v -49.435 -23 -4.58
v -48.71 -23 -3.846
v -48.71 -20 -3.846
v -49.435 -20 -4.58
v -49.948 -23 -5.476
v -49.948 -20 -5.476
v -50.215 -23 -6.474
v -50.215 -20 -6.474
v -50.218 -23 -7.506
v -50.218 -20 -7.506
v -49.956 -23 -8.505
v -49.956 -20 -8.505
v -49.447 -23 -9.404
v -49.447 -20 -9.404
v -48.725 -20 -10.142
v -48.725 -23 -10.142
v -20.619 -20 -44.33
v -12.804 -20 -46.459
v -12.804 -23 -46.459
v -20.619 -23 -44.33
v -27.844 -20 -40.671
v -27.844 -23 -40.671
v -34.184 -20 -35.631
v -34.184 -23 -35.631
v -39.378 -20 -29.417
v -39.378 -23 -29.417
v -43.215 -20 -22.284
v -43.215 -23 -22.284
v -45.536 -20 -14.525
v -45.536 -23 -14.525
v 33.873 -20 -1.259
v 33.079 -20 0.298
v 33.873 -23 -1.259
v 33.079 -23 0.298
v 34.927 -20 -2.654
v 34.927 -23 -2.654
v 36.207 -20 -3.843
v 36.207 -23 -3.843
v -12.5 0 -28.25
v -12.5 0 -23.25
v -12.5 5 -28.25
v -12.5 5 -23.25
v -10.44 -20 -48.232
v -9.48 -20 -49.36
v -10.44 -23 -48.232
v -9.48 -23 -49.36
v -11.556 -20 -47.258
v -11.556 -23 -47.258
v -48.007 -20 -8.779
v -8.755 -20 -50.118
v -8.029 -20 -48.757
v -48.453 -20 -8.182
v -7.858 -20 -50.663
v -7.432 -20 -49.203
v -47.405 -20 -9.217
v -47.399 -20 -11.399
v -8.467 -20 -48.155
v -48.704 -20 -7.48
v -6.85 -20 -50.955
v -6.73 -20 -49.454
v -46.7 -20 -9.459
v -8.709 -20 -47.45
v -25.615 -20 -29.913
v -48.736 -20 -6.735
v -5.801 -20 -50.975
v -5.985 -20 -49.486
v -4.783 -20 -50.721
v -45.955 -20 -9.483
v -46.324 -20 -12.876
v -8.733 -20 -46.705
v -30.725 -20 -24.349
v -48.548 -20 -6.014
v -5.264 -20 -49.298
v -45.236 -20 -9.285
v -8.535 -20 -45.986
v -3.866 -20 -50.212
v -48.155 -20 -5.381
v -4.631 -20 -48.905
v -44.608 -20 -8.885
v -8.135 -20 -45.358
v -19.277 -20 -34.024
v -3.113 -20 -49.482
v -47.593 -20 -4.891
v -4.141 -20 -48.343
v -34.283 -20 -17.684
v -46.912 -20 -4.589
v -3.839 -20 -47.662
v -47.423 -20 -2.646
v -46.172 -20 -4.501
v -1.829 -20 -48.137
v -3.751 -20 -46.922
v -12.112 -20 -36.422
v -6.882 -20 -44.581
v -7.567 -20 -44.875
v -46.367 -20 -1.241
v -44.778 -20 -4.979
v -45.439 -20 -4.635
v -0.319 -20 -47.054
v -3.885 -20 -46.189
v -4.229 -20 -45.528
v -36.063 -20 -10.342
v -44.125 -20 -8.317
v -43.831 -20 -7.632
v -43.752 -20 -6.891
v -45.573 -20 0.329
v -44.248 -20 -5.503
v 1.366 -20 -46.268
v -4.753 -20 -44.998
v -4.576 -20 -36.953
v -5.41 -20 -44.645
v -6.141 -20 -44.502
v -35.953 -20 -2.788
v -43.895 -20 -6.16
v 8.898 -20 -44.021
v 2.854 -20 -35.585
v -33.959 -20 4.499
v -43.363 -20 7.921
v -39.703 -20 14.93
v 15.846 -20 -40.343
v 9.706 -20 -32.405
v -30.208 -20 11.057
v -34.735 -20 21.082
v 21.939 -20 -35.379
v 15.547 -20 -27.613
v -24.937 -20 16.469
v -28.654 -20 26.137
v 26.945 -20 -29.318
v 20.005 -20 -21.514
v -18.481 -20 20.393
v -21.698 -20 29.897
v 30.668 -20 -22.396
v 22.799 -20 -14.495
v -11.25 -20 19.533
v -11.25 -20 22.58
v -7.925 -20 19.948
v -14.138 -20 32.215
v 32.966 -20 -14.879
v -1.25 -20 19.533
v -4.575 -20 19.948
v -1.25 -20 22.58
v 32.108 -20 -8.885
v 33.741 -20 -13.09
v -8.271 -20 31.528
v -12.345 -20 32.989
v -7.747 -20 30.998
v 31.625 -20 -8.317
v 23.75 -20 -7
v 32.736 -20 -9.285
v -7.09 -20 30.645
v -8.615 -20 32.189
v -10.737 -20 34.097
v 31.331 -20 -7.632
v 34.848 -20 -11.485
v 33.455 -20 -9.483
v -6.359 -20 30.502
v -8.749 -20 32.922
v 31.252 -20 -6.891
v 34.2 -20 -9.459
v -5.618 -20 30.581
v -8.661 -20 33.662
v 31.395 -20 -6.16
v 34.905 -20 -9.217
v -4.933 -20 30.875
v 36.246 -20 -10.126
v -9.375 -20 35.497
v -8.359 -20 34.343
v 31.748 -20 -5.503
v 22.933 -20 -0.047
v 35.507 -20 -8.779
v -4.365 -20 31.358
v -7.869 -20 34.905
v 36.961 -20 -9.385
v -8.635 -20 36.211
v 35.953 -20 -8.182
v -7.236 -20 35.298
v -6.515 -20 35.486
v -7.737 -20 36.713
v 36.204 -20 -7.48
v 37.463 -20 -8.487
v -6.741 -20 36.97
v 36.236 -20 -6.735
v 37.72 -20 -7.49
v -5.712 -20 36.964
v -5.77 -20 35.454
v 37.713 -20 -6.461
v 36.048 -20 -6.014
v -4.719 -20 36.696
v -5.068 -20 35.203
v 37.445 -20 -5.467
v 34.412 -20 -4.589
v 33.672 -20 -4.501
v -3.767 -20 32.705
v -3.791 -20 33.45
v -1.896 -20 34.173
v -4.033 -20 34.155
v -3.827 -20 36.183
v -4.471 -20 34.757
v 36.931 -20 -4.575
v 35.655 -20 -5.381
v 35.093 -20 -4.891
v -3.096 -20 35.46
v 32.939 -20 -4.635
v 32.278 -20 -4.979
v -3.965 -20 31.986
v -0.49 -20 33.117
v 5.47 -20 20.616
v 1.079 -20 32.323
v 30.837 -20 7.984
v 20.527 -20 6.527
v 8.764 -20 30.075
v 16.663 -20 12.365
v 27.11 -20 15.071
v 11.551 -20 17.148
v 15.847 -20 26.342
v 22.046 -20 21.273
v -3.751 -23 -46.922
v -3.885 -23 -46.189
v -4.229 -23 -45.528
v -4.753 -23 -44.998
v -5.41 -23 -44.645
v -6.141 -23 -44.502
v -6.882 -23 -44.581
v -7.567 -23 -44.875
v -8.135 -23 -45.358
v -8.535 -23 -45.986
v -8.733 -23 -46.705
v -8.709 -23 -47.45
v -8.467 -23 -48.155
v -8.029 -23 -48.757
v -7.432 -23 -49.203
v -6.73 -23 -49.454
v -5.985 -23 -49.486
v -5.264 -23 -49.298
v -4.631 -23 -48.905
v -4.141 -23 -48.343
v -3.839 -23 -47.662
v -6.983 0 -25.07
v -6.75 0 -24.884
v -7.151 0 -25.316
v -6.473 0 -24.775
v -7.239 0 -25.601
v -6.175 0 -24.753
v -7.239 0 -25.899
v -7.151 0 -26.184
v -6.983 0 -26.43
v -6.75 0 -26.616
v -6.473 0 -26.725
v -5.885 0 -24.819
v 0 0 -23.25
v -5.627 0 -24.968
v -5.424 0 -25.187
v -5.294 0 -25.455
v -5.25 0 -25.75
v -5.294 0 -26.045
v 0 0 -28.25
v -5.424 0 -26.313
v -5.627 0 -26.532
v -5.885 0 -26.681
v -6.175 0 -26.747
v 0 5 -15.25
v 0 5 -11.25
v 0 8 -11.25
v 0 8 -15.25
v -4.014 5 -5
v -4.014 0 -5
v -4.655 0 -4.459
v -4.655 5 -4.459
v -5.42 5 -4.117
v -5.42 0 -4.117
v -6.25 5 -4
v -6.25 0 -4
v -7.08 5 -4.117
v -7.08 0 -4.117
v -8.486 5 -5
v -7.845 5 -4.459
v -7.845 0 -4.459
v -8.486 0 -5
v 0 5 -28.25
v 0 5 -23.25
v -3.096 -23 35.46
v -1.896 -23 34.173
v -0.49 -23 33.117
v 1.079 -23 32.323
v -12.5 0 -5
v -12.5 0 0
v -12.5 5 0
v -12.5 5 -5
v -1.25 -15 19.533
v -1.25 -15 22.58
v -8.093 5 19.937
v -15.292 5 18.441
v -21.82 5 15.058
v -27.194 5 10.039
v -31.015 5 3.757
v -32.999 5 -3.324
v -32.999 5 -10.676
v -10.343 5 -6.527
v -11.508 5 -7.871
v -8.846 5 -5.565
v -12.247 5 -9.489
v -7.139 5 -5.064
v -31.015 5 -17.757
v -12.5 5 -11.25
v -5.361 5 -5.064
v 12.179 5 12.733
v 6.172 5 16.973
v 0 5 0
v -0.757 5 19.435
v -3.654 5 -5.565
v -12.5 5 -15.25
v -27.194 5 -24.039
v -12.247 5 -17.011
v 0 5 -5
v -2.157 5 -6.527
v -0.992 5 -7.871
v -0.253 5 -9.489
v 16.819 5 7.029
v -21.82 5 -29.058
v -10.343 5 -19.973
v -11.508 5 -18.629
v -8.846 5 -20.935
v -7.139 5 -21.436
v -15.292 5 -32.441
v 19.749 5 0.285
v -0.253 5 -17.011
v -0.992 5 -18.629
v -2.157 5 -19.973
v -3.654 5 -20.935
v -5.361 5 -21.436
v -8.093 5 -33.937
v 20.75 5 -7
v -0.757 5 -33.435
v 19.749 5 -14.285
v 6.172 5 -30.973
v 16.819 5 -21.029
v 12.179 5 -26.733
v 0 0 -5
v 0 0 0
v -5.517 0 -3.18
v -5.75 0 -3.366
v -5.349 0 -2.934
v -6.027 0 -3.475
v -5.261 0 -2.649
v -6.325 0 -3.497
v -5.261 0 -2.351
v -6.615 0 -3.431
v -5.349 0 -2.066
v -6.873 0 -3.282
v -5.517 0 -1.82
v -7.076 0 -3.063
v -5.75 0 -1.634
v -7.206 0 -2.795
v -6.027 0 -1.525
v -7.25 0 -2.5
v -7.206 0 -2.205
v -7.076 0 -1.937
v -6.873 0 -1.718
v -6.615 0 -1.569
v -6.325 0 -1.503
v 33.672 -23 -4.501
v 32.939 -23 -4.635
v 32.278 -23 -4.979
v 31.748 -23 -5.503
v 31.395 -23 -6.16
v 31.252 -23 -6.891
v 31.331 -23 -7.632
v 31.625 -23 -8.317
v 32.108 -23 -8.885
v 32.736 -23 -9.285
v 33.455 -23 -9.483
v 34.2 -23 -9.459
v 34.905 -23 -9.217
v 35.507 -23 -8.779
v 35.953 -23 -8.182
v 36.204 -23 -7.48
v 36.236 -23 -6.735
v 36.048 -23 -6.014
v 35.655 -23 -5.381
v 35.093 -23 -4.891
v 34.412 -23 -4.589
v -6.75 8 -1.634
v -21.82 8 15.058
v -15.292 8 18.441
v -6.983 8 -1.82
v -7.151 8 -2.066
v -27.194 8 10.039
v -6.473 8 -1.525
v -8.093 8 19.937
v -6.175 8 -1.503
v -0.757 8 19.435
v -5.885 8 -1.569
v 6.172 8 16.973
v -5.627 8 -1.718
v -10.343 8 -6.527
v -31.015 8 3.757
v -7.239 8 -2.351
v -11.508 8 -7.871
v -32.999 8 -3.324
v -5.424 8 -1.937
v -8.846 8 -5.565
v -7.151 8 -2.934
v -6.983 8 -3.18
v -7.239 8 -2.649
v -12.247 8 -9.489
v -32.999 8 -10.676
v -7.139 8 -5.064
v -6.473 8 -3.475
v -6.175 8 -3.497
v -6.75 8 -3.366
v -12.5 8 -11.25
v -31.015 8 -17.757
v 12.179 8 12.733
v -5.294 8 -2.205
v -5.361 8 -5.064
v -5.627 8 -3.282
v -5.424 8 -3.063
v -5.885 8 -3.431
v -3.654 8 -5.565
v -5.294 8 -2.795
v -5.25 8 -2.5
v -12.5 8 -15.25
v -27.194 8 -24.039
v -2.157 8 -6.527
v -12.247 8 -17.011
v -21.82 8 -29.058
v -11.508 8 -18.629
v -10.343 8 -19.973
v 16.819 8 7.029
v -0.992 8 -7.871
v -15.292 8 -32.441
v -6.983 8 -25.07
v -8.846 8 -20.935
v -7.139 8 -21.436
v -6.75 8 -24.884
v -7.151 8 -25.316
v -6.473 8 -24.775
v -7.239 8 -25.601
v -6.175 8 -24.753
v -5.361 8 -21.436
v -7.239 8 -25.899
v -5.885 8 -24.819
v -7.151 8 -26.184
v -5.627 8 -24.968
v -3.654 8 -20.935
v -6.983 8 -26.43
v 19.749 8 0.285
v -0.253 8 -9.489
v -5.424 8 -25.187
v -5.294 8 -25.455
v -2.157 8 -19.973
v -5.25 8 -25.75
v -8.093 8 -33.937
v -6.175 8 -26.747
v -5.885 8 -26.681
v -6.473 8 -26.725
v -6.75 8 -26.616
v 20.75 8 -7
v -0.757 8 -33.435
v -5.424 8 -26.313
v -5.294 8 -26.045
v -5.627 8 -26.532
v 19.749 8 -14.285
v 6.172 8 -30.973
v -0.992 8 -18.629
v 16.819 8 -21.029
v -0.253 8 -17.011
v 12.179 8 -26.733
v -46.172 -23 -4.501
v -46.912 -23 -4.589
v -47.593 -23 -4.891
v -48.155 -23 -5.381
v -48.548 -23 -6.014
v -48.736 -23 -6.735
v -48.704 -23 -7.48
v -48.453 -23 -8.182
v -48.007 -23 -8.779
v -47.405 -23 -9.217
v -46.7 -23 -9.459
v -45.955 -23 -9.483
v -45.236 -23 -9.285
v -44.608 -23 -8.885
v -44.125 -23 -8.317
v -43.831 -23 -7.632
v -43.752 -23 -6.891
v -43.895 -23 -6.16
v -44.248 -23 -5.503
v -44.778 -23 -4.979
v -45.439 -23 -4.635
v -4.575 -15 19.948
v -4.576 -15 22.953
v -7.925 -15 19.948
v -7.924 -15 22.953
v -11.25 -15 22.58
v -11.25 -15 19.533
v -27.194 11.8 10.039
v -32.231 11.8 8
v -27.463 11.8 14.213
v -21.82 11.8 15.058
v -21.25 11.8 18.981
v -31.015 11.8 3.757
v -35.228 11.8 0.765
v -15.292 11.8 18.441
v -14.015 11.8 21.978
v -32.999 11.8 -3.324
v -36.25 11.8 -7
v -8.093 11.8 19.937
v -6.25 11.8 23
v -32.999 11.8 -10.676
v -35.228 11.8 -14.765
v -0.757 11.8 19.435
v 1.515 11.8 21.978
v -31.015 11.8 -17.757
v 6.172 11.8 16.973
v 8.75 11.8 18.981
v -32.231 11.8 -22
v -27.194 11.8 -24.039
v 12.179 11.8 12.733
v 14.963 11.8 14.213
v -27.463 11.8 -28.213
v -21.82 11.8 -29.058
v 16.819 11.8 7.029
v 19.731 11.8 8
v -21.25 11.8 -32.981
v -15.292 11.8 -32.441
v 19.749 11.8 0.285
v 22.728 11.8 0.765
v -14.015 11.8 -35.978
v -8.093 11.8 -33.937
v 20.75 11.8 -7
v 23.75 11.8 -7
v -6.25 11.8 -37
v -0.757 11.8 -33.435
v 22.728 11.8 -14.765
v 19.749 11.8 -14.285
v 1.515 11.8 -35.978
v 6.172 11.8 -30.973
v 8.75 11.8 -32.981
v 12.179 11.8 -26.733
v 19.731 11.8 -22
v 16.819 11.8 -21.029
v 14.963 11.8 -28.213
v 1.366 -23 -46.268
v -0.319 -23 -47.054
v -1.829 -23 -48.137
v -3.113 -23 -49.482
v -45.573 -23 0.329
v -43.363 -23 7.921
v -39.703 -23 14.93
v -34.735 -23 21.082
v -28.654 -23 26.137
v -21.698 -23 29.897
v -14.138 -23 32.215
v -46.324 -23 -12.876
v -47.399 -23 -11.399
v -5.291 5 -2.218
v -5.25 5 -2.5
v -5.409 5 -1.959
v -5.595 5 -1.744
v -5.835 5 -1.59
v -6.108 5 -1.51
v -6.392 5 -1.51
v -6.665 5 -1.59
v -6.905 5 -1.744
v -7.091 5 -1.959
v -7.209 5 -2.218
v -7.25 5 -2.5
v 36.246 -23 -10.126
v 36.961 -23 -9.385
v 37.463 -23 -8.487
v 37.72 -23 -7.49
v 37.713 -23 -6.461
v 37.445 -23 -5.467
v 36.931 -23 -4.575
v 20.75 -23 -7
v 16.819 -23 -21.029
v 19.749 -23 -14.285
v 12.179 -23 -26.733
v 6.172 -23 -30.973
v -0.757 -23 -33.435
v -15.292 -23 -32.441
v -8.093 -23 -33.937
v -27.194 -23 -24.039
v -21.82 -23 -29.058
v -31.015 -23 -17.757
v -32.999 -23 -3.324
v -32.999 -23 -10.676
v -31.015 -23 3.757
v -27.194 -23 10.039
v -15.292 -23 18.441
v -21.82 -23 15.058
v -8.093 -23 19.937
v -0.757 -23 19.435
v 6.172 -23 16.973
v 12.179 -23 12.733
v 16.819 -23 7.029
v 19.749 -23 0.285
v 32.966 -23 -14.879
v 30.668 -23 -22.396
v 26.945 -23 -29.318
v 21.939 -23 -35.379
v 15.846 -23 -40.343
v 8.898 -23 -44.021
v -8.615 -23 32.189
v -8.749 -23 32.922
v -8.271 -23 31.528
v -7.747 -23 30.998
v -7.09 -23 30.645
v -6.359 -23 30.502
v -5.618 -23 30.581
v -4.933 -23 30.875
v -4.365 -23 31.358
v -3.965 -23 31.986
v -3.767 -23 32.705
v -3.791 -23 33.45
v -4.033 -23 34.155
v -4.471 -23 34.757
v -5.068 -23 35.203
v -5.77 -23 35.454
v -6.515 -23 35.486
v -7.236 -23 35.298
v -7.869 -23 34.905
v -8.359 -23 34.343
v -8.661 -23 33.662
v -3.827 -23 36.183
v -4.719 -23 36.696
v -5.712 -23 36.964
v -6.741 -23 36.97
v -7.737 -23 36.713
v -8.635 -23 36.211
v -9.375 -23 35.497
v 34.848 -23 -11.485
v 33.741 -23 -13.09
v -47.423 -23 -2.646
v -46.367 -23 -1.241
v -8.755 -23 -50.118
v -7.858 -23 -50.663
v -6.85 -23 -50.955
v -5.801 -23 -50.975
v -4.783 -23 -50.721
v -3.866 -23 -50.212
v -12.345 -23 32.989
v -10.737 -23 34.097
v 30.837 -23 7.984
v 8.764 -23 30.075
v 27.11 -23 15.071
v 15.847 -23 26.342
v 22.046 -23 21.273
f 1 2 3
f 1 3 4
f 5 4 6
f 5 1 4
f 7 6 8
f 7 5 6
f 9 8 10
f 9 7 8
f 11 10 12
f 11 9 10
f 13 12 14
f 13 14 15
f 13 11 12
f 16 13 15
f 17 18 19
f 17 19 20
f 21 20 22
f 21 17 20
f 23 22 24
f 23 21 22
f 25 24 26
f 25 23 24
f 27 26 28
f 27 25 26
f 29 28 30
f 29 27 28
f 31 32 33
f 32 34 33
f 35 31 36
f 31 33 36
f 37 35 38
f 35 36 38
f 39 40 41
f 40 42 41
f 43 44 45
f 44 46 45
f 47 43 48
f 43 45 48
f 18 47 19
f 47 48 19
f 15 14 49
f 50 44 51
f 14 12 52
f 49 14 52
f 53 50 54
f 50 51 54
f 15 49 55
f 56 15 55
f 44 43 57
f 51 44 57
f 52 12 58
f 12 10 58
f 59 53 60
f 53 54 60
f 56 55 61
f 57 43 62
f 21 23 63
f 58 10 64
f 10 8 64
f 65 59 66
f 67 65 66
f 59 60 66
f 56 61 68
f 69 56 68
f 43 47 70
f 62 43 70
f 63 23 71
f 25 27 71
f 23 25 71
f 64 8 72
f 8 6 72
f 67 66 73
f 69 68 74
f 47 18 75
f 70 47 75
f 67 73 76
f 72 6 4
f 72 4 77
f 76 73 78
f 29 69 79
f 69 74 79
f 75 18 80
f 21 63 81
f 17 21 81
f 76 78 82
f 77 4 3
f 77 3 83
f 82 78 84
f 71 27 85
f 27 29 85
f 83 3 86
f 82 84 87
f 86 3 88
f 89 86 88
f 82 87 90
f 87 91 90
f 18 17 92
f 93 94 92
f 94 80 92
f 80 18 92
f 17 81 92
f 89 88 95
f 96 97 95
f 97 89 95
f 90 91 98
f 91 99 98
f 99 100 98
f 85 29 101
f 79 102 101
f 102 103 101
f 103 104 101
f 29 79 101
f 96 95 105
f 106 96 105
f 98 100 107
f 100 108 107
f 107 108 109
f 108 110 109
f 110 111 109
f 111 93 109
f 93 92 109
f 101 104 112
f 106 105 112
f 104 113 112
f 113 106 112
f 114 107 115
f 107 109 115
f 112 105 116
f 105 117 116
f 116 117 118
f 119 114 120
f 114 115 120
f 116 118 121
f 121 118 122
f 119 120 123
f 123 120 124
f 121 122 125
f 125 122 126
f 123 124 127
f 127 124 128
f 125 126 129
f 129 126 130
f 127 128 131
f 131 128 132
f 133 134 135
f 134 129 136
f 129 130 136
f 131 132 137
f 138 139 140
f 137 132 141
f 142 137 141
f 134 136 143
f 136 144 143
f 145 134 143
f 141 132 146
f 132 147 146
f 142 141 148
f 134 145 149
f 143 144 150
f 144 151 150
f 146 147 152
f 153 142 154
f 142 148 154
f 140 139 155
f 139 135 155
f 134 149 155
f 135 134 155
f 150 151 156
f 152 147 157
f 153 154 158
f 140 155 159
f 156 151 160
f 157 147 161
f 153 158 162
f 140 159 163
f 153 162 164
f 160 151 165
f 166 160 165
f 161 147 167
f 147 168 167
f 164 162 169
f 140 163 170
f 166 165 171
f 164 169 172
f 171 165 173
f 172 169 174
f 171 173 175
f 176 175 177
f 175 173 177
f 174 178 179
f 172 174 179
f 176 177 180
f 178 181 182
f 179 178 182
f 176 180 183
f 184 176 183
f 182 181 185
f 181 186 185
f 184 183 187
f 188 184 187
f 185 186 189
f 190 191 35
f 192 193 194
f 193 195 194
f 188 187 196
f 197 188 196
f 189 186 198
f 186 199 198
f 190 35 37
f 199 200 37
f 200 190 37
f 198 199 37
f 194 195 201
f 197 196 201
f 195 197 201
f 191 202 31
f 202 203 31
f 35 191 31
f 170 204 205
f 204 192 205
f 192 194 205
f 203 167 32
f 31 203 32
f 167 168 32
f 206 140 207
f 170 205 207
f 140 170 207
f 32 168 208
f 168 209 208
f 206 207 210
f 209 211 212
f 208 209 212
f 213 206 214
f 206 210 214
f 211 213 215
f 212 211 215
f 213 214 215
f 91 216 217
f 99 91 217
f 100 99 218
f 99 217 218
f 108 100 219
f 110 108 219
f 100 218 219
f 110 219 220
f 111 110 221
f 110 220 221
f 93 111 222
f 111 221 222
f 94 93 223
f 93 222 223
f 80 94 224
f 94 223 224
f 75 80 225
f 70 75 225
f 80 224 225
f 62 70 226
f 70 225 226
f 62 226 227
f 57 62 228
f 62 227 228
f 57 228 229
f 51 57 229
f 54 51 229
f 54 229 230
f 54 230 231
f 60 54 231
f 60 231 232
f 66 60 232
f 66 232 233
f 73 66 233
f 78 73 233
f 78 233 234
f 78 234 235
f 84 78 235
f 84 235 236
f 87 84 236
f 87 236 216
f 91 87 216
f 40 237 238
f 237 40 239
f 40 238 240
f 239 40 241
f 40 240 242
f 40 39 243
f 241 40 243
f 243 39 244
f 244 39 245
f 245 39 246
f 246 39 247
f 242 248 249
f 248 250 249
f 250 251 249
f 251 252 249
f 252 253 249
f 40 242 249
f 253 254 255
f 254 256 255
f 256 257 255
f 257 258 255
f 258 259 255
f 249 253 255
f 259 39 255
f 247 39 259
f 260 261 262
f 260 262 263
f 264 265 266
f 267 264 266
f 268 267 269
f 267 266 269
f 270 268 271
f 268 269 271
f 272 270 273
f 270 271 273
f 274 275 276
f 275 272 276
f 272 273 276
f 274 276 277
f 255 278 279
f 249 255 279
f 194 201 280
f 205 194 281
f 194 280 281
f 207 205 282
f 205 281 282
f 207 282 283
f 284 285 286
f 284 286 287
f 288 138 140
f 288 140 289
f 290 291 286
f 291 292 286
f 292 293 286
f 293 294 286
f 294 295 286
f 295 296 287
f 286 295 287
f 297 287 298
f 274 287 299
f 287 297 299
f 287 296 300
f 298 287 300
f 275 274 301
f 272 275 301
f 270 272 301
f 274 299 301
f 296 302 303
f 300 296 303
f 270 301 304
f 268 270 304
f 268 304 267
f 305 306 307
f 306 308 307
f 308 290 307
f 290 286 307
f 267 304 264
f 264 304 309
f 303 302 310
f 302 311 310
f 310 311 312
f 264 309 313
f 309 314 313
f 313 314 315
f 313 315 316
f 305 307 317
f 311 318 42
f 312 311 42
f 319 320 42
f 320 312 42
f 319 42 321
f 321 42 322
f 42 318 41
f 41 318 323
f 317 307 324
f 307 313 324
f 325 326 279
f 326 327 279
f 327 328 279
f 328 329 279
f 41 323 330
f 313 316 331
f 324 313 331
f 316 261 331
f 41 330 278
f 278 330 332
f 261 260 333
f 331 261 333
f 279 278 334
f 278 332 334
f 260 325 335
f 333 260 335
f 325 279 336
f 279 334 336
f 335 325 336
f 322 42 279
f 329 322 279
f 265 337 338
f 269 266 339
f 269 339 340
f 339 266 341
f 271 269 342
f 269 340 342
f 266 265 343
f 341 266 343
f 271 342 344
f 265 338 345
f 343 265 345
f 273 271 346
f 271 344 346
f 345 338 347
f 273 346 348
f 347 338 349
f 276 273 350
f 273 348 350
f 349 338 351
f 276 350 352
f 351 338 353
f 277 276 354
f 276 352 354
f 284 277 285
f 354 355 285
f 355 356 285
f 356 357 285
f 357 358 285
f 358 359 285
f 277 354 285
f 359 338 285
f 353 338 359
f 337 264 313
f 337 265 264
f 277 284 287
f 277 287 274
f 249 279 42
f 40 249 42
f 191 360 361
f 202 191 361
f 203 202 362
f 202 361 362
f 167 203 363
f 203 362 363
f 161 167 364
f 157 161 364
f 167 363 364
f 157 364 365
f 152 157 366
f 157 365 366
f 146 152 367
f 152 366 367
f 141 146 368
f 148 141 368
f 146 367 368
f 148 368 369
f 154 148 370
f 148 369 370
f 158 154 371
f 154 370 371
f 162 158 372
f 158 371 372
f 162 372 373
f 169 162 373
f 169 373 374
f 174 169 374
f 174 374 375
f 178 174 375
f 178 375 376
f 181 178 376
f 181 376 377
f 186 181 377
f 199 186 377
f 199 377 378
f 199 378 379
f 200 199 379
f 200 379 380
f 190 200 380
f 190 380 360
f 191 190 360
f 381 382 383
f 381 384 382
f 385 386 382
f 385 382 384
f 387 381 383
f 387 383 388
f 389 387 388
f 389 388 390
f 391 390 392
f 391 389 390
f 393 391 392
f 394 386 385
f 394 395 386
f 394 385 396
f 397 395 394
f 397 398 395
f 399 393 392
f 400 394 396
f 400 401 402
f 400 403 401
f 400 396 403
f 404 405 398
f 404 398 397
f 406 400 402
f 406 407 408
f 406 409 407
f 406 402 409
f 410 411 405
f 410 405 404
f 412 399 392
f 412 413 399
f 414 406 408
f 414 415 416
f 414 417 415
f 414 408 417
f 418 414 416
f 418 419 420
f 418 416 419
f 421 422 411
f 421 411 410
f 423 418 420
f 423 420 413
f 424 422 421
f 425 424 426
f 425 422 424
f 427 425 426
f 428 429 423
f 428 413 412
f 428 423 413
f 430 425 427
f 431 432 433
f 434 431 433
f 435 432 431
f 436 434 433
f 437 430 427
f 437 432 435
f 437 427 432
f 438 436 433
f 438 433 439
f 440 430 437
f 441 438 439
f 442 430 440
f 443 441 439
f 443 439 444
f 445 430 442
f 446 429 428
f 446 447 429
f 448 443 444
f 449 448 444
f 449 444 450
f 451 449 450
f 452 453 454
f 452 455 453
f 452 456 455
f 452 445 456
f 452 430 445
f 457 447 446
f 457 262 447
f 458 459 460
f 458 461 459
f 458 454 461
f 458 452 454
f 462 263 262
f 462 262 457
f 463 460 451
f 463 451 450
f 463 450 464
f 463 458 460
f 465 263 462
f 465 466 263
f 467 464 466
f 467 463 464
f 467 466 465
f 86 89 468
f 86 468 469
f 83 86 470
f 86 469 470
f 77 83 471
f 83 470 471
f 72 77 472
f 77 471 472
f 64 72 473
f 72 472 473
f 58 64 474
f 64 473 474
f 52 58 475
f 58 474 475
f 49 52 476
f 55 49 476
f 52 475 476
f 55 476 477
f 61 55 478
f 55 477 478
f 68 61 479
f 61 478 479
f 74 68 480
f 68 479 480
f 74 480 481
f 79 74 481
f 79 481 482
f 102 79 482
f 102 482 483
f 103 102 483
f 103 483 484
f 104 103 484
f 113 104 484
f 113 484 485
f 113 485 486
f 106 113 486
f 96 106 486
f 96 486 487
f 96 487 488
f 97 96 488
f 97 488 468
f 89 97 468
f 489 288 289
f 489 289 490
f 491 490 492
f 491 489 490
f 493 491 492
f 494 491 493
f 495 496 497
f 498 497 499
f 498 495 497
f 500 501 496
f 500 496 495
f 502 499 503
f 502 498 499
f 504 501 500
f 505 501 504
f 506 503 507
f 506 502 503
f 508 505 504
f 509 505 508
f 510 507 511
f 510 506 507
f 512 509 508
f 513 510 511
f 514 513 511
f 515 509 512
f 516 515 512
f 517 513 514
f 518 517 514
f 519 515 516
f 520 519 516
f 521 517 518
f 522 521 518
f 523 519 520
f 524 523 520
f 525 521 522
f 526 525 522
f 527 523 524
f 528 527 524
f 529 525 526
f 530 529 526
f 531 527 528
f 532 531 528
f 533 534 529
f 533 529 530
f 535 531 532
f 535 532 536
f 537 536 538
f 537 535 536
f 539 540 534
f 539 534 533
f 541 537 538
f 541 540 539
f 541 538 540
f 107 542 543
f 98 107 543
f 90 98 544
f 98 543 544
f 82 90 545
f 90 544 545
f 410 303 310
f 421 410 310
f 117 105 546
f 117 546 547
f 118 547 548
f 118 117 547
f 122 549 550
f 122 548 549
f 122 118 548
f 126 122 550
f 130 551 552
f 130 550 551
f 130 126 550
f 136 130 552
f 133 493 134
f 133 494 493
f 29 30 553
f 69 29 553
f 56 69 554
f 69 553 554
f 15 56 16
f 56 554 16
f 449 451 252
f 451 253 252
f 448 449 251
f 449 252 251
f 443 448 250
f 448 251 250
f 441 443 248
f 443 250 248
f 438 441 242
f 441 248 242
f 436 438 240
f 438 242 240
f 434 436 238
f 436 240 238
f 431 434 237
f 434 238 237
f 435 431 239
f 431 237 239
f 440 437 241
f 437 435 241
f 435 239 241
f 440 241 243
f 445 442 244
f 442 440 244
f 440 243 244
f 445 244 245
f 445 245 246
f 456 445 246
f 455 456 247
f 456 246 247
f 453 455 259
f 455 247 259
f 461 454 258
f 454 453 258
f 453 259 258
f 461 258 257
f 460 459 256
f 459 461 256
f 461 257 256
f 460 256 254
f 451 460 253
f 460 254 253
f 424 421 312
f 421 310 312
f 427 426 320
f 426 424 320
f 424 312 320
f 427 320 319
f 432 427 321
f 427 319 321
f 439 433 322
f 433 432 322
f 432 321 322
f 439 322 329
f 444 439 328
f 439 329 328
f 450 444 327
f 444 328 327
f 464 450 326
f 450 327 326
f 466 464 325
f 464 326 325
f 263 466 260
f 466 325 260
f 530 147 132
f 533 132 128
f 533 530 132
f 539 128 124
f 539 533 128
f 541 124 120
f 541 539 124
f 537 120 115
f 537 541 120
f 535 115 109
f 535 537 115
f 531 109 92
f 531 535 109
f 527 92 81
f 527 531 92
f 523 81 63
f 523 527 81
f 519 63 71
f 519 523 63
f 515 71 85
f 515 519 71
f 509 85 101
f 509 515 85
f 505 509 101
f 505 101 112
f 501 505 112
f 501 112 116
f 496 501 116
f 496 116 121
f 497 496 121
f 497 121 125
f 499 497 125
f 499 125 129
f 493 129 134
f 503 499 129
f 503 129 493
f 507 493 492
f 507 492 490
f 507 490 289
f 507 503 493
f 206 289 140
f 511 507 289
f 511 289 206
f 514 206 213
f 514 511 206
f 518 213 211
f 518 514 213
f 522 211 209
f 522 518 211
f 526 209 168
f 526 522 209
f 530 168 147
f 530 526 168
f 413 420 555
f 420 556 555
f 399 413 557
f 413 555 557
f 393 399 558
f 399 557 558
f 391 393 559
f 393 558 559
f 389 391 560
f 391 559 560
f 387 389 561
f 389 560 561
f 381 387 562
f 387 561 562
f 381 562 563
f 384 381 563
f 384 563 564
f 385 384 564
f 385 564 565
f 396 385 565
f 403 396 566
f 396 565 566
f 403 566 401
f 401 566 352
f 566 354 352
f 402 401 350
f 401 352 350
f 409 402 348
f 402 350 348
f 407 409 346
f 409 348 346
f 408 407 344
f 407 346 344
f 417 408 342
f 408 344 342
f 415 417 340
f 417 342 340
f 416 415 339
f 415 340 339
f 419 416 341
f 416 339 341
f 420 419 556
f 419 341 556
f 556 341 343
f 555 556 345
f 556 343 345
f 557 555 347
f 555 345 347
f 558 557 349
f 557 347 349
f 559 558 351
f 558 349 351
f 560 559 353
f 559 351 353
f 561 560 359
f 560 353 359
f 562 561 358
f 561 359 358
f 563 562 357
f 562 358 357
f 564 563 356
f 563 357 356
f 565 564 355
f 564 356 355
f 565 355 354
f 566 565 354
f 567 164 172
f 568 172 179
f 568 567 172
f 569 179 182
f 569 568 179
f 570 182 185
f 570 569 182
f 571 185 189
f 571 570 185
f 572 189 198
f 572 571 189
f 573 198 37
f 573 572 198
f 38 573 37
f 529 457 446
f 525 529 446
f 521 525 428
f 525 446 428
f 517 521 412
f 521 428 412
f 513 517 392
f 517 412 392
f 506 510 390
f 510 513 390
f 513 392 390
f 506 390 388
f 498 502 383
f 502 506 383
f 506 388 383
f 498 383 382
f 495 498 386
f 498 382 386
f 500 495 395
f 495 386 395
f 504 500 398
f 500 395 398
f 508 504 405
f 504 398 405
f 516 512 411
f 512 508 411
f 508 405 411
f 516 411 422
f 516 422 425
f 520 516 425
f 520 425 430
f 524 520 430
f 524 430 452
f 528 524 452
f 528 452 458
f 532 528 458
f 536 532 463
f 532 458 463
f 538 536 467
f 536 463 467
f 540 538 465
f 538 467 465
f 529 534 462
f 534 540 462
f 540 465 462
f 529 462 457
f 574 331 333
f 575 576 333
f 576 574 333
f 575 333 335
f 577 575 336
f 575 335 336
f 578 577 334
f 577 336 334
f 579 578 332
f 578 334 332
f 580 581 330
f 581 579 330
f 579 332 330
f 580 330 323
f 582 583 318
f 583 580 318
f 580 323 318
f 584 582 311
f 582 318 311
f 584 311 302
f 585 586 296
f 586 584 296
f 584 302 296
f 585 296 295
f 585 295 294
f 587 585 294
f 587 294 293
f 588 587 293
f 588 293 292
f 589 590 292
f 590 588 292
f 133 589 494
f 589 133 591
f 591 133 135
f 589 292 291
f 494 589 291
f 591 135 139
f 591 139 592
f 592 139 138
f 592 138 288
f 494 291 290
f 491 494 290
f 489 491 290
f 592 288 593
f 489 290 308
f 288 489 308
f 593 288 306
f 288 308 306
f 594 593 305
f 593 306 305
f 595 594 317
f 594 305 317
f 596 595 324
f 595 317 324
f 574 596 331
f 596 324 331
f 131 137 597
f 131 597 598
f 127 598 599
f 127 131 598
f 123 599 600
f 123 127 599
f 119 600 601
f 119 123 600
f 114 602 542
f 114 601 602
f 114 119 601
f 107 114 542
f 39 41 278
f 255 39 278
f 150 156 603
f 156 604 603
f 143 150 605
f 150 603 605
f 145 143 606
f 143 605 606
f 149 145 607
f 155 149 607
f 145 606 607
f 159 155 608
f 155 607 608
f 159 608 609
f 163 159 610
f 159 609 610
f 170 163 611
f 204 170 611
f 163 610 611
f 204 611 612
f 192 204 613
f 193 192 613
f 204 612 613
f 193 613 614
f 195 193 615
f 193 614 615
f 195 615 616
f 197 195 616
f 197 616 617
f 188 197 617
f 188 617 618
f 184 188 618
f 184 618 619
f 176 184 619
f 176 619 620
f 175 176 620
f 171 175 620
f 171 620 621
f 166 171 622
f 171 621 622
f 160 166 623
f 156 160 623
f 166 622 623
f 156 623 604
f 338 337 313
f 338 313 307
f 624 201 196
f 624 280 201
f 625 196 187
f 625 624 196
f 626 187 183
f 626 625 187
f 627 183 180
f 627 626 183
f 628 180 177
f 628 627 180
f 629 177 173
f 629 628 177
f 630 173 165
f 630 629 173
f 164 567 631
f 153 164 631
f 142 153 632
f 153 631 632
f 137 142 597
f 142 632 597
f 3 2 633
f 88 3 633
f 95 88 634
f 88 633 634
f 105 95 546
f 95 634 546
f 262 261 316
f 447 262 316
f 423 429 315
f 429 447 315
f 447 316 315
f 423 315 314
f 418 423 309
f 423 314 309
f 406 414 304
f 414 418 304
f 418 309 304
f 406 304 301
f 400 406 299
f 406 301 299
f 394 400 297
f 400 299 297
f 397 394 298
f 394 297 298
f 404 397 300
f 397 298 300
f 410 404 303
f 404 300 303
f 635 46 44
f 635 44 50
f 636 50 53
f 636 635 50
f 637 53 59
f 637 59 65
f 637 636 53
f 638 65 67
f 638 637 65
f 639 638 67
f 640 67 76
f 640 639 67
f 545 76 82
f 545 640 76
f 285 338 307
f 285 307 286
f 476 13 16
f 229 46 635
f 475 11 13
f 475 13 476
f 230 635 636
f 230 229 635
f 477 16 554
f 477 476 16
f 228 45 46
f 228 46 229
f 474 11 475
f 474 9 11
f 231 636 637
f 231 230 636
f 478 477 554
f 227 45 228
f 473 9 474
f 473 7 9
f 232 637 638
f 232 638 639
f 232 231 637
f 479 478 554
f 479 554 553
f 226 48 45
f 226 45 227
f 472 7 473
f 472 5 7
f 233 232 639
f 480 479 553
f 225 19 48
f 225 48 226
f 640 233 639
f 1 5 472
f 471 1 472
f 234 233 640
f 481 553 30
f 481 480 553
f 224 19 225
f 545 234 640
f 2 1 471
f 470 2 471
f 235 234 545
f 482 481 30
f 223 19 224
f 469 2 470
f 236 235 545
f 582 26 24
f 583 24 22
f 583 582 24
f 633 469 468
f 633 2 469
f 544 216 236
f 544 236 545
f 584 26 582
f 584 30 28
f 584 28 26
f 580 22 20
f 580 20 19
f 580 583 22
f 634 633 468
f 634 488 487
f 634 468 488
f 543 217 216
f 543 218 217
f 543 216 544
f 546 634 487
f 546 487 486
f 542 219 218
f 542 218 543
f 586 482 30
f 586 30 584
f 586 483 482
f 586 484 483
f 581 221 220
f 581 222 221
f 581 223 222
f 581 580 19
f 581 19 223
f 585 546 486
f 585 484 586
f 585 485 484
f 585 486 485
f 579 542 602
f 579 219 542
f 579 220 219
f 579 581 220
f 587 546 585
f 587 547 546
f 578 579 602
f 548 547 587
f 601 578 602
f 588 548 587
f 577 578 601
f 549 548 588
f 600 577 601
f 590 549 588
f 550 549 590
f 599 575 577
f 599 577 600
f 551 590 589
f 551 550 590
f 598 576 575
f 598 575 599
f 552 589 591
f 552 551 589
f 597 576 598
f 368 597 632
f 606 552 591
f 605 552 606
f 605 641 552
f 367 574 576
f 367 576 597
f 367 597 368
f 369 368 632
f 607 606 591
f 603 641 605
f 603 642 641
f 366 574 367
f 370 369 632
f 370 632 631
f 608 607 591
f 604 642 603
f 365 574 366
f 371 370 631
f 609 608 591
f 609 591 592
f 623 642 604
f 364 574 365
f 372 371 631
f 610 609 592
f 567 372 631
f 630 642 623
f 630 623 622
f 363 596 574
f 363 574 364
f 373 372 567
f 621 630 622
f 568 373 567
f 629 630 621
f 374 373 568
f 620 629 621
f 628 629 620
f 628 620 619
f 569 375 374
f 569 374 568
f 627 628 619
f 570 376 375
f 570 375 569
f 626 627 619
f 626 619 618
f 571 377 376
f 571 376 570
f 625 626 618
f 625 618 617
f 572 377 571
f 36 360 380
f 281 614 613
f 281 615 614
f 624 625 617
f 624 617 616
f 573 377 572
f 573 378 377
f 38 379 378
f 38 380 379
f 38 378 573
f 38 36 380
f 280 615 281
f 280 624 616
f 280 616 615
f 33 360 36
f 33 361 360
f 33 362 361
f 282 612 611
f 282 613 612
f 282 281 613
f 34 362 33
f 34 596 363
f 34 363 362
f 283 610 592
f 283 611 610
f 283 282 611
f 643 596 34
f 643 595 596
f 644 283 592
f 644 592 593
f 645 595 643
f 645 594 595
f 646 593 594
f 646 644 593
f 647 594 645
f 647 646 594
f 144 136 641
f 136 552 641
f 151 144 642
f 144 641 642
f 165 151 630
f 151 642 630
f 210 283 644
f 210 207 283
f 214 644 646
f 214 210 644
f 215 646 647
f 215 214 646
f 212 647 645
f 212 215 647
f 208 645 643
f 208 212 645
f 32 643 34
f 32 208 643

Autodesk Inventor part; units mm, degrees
ref_plane "YZ Plane" through (0, 0, 0) normal (1, 0, 0) x (0, 1, 0)
ref_plane "XZ Plane" through (0, 0, 0) normal (0, 1, 0) x (-1, 0, 0)
ref_plane "XY Plane" through (0, 0, 0) normal (0, 0, 1) x (1, 0, 0)
sketch "Boceto1" plane through (0, 0, 0) normal (0, 1, 0) x (-1, 0, 0)
  line L0 (0, 0) -> (12.5, 0)
  line L1 (12.5, 0) -> (12.5, -5)
  line L2 (0, -5) -> (0, 0)
  circle A0 centre (6.25, -2.5) radius 1
  arc A1 (8.4861, -5) -> (4.0139, -5) centre (6.25, -7) ccw
  line L3 (12.5, -5) -> (8.4861, -5)
  line L4 (4.0139, -5) -> (0, -5)
  dimension "d1" = 5
  dimension "d2" = 2
  dimension "d4" = 6
extrude "Extrusión1" add sketch "Boceto1" along normal blind 5
sketch "Boceto2" plane through (0, 5, 0) normal (0, 1, 0) x (1, 0, 0)
  line L0 (0, 5) -> (-4.0139, 5) projected
  arc A0 (-8.4861, 5) -> (-4.0139, 5) centre (-6.25, 7) ccw projected
  line L1 (-8.4861, 5) -> (-12.5, 5) projected
  line L2 (-12.5, 5) -> (-12.5, 0) projected
  line L3 (-12.5, 0) -> (0, 0) projected
  line L4 (0, 0) -> (0, 5) projected
  circle A1 centre (-6.25, 2.5) radius 1 projected
  arc A2 (-12.5, 11.25) -> (0, 11.25) centre (-6.25, 11.25) ccw
  arc A3 (0, 15.25) -> (-12.5, 15.25) centre (-6.25, 15.25) ccw
  line L5 (-12.5, 11.25) -> (-12.5, 15.25)
  line L6 (0, 11.25) -> (0, 15.25)
  line L7 (0, 23.25) -> (-12.5, 23.25)
  line L8 (-12.5, 23.25) -> (-12.5, 28.25)
  line L9 (-12.5, 28.25) -> (0, 28.25)
  line L10 (0, 28.25) -> (0, 23.25)
  circle A4 centre (-6.25, 25.75) radius 1
  circle A5 centre (-6.25, 7) radius 27
  circle A6 centre (-6.25, 7) radius 30
  dimension "d8" = 12.5
  dimension "d10" = 12.5
  dimension "d12" = 12.5
  dimension "d13" = 5
  dimension "d14" = 2
  dimension "d15" = 54
  dimension "d17" = 3
extrude "Extrusión2" add sketch "Boceto2" along normal blind 3 contours A5
extrude "Extrusión3" add sketch "Boceto2" against normal blind 5 contours L7 L8 L9 L10
extrude "Extrusión4" add sketch "Boceto2" along normal blind 6.8 contours A6
sketch "Boceto3" plane through (0, 5, 0) normal (0, 1, 0) x (1, 0, 0)
  line L0 (-4.0139, 5) -> (0, 5) projected
  line L1 (0, 0) -> (-12.5, 0) projected
  line L2 (0, 5) -> (-12.5, 5)
  line L3 (-12.5, 5) -> (-12.5, 0)
  line L4 (-12.5, 0) -> (0, 0)
  line L5 (0, 0) -> (0, 5)
  line L6 (-12.5, 28.25) -> (0, 28.25) projected
  line L7 (0, 23.25) -> (-12.5, 23.25) projected
  line L8 (0, 28.25) -> (-12.5, 28.25)
  line L9 (-12.5, 28.25) -> (-12.5, 23.25)
  line L10 (-12.5, 23.25) -> (0, 23.25)
  line L11 (0, 23.25) -> (0, 28.25)
  circle A0 centre (-6.25, 25.75) radius 1 projected
  circle A1 centre (-6.25, 25.75) radius 1
  circle A2 centre (-6.25, 2.5) radius 1 projected
  circle A3 centre (-6.25, 2.5) radius 1
  dimension "d24" = 12.5
  dimension "d25" = 5
  dimension "d26" = 12.5
  dimension "d27" = 5
  dimension "d28" = 2
  dimension "d29" = 2
extrude "Extrusión5" add sketch "Boceto3" along normal blind 3
sketch "Boceto4" plane through (-6.25, 5, -7) normal (0, -1, 0) x (1, 0, 0)
  circle A0 centre (0, 0) radius 27 projected
  circle A1 centre (0, 0) radius 30
  circle A2 centre (0, 0) radius 27
  point P0 (6.25, 7)
  dimension "d32" = 60
  dimension "d33" = 54
extrude "Extrusión6" add sketch "Boceto4" along normal blind 25
sketch "Boceto5" plane through (-6.25, -20, -7) normal (0, -1, 0) x (1, 0, 0)
  circle A0 centre (0, 0) radius 27 projected
  arc A1 (6.25, -4.25) -> (-6.25, -4.25) centre (0, -4.25) ccw projected
  line L0 (6.25, -8.25) -> (6.25, -4.25) projected
  arc A2 (-6.25, -8.25) -> (6.25, -8.25) centre (0, -8.25) ccw projected
  line L1 (-6.25, -4.25) -> (-6.25, -8.25) projected
  arc A3 (2.2361, 2) -> (-2.2361, 2) centre (0, 0) ccw projected
  line L2 (-2.2361, 2) -> (-6.25, 2) projected
  line L3 (-6.25, 2) -> (-6.25, 7) projected
  line L4 (-6.25, 7) -> (6.25, 7) projected
  line L5 (6.25, 7) -> (6.25, 2) projected
  line L6 (6.25, 2) -> (2.2361, 2) projected
  line L7 (6.25, -16.25) -> (-6.25, -16.25) projected
  line L8 (6.25, -21.25) -> (6.25, -16.25) projected
  line L9 (-6.25, -21.25) -> (6.25, -21.25) projected
  line L10 (-6.25, -16.25) -> (-6.25, -21.25) projected
  circle A4 centre (0, 0) radius 30 projected
  circle A5 centre (0, 0) radius 27 projected
  circle A6 centre (0, 0) radius 40
  circle A7 centre (0, 0) radius 30 projected
  line L11 (0, 30) -> (5, 30)
  line L12 (5, 30) -> (-5, 30)
  line L13 (-5, 30) -> (-5, 26.533)
  circle A8 centre (0, 0) radius 27 projected
  line L14 (5, 30) -> (5, 26.533)
  circle A9 centre (0, 0) radius 27
  circle A10 centre (0, 0) radius 30
  dimension "d36" = 80
  dimension "d37" = 5
  dimension "d38" = 10
extrude "Extrusión7" add sketch "Boceto5" along normal blind 3 contours A0 L14 A4 L13 | A0 L13 A4 L14 | A4 L11 L14 | L13 L12 A4 | A6
sketch "Boceto6" plane through (-6.25, -23, -7) normal (0, -1, 0) x (1, 0, 0)
  circle A0 centre (0, 0) radius 30 projected
  circle A1 centre (0, 0) radius 40 projected
  circle A2 centre (0, 0) radius 27 projected
  circle A3 centre (0, 0) radius 30 projected
  circle A4 centre (0, 0) radius 30 projected
  circle A5 centre (0, 0) radius 40 projected
  arc A6 (42.4961, -3.1256) -> (42.4568, 3.1566) centre (40, 0) ccw
  circle A7 centre (40, 0) radius 2.5
  circle A8 centre (0, 0) radius 40
  arc A9 (42.4961, -3.1256) -> (39.2164, -7.8789) centre (48.7365, -10.9396) ccw
  line L0 (39.8, 3.995) -> (39.8, 3.995)
  arc A10 (39.3287, 7.2975) -> (42.4568, 3.1566) centre (48.5987, 11.0482) ccw
  arc A11 (3.1545, 42.4596) -> (-3.1252, 42.4966) centre (0, 40) ccw
  circle A12 centre (0, 40) radius 2.5
  line L1 (3.995, 39.8) -> (3.995, 39.8)
  line L2 (9.1155, 38.7955) -> (7.182, 39.1748)
  arc A13 (3.1545, 42.4596) -> (9.1155, 38.7955) centre (11.0406, 48.6084) ccw
  line L3 (-3.995, 39.8) -> (-3.995, 39.8)
  line L4 (-9.2166, 38.8873) -> (-9.7422, 38.7955)
  arc A14 (-9.2166, 38.8873) -> (-3.1252, 42.4966) centre (-10.9383, 48.738) ccw
  arc A15 (-3.2297, -42.3598) -> (3.1372, -42.4816) centre (0, -40) ccw
  circle A16 centre (0, -40) radius 2.5
  arc A17 (-42.4596, 3.1545) -> (-42.4753, -3.1421) centre (-40, 0) ccw
  circle A18 centre (-40, 0) radius 2.5
  line L5 (-8.8392, -38.5679) -> (-8.6091, -38.6265)
  arc A19 (7.6163, -39.2682) -> (3.1372, -42.4816) centre (10.9801, -48.6855) ccw
  arc A20 (-3.2297, -42.3598) -> (-6.5544, -39.4593) centre (-11.3041, -48.2594) ccw
  arc A21 (-42.4596, 3.1545) -> (-39.3229, 7.3286) centre (-48.6084, 11.0406) ccw
  arc A22 (-39.2858, -7.5248) -> (-42.4753, -3.1421) centre (-48.6635, -10.9974) ccw
  point P0 (6.25, 7)
  point P1 (39.8, -3.995)
  point P2 (3.995, -39.8)
  point P3 (-3.995, -39.8)
  point P4 (-39.8, -3.995)
  point P5 (-39.8, 3.995)
  point P6 (-39.2858, -7.5248)
  point P7 (-39.9219, -2.4988)
  point P8 (-39.9219, 2.4988)
  point P9 (-39.3229, 7.3286)
  point P10 (-7.8886, 39.2144)
  point P11 (-2.4988, 39.9219)
  point P12 (2.4988, 39.9219)
  point P13 (7.3286, 39.3229)
  point P14 (2.4988, -39.9219)
  point P15 (-2.4988, -39.9219)
  point P16 (-6.5544, -39.4593)
  point P17 (39.3287, 7.2975)
  point P18 (39.9219, 2.4988)
  point P19 (39.9219, -2.4988)
  dimension "d41" = 8
  dimension "d42" = 5
  dimension "d43" = 10
  dimension "d44" = 10
  dimension "d45" = 8
  dimension "d46" = 5
  dimension "d47" = 10
  dimension "d48" = 10
  dimension "d49" = 8
  dimension "d50" = 5
  dimension "d51" = 8
  dimension "d52" = 5
  dimension "d53" = 10
  dimension "d54" = 10
extrude "Extrusión8" add sketch "Boceto6" against normal blind 3 contours A1 A18 A22 A17 A21 | A14 A11 A13 A1 A12 | A1 A16 A19 A15 A20 | A10 A6 A9 A1 A7
extrude "Extrusión9" cut sketch "Boceto6" against normal blind 3 contours A18 A1 | A1 A12 | A16 A1 | A1 A7 picked at (-39.1609, 0) picked at (-0.0985, 39.1667) picked at (-0.0985, -39.1667) picked at (39.2158, -0.5677)
sketch "Boceto7" plane through (0, 0, 0) normal (0, 0, 1) x (1, 0, 0)
  line L0 (-36.25, -20) -> (23.75, -20) projected
  line L1 (23.75, 11.8) -> (-36.25, 11.8) projected
  line L2 (-3.0955, -23) -> (-9.3752, -23) projected
  line L3 (-3.0955, -23) -> (-3.0955, -20) projected
  line L4 (-9.3752, -20) -> (-3.0955, -20) projected
  line L5 (-9.3752, -23) -> (-9.3752, -20) projected
  line L6 (1.0786, -23) -> (-3.0955, -23) projected
  line L7 (1.0786, -20) -> (1.0786, -23) projected
  line L8 (-3.0955, -20) -> (1.0786, -20) projected
  line L9 (-3.0955, -23) -> (-3.0955, -20) projected
  line L10 (-12.8044, -20) -> (-12.8044, -23) projected
  line L11 (-9.3752, -23) -> (-14.1386, -23) projected
  line L12 (-9.3752, -23) -> (-9.3752, -20) projected
  line L13 (-14.1386, -20) -> (-9.3752, -20) projected
  line L14 (-14.1386, -23) -> (-14.1386, -20) projected
  line L15 (-3.75, -20) -> (-3.75, -23) projected
  line L16 (-3.75, -21.5) -> (-8.75, -21.5)
  line L17 (-6.25, -22.5562) -> (-1.25, -22.5562)
  line L18 (-1.25, -22.5562) -> (-11.25, -22.5562)
  line L19 (-11.25, -22.5562) -> (-11.25, -20)
  line L20 (-11.25, -20) -> (-1.25, -20)
  line L21 (-1.25, -20) -> (-1.25, -15)
  line L22 (-1.25, -15) -> (-11.25, -15)
  line L23 (-11.25, -15) -> (-11.25, -20)
  point P0 (0, 0)
  dimension "d59" = 5
  dimension "d60" = 5
  dimension "d61" = 10
  dimension "d62" = 10
  dimension "d63" = 5
extrude "Extrusión10" cut sketch "Boceto7" along normal blind 30 contours L23 L22 L21 L0
properties part number "Pieza1parte3"
